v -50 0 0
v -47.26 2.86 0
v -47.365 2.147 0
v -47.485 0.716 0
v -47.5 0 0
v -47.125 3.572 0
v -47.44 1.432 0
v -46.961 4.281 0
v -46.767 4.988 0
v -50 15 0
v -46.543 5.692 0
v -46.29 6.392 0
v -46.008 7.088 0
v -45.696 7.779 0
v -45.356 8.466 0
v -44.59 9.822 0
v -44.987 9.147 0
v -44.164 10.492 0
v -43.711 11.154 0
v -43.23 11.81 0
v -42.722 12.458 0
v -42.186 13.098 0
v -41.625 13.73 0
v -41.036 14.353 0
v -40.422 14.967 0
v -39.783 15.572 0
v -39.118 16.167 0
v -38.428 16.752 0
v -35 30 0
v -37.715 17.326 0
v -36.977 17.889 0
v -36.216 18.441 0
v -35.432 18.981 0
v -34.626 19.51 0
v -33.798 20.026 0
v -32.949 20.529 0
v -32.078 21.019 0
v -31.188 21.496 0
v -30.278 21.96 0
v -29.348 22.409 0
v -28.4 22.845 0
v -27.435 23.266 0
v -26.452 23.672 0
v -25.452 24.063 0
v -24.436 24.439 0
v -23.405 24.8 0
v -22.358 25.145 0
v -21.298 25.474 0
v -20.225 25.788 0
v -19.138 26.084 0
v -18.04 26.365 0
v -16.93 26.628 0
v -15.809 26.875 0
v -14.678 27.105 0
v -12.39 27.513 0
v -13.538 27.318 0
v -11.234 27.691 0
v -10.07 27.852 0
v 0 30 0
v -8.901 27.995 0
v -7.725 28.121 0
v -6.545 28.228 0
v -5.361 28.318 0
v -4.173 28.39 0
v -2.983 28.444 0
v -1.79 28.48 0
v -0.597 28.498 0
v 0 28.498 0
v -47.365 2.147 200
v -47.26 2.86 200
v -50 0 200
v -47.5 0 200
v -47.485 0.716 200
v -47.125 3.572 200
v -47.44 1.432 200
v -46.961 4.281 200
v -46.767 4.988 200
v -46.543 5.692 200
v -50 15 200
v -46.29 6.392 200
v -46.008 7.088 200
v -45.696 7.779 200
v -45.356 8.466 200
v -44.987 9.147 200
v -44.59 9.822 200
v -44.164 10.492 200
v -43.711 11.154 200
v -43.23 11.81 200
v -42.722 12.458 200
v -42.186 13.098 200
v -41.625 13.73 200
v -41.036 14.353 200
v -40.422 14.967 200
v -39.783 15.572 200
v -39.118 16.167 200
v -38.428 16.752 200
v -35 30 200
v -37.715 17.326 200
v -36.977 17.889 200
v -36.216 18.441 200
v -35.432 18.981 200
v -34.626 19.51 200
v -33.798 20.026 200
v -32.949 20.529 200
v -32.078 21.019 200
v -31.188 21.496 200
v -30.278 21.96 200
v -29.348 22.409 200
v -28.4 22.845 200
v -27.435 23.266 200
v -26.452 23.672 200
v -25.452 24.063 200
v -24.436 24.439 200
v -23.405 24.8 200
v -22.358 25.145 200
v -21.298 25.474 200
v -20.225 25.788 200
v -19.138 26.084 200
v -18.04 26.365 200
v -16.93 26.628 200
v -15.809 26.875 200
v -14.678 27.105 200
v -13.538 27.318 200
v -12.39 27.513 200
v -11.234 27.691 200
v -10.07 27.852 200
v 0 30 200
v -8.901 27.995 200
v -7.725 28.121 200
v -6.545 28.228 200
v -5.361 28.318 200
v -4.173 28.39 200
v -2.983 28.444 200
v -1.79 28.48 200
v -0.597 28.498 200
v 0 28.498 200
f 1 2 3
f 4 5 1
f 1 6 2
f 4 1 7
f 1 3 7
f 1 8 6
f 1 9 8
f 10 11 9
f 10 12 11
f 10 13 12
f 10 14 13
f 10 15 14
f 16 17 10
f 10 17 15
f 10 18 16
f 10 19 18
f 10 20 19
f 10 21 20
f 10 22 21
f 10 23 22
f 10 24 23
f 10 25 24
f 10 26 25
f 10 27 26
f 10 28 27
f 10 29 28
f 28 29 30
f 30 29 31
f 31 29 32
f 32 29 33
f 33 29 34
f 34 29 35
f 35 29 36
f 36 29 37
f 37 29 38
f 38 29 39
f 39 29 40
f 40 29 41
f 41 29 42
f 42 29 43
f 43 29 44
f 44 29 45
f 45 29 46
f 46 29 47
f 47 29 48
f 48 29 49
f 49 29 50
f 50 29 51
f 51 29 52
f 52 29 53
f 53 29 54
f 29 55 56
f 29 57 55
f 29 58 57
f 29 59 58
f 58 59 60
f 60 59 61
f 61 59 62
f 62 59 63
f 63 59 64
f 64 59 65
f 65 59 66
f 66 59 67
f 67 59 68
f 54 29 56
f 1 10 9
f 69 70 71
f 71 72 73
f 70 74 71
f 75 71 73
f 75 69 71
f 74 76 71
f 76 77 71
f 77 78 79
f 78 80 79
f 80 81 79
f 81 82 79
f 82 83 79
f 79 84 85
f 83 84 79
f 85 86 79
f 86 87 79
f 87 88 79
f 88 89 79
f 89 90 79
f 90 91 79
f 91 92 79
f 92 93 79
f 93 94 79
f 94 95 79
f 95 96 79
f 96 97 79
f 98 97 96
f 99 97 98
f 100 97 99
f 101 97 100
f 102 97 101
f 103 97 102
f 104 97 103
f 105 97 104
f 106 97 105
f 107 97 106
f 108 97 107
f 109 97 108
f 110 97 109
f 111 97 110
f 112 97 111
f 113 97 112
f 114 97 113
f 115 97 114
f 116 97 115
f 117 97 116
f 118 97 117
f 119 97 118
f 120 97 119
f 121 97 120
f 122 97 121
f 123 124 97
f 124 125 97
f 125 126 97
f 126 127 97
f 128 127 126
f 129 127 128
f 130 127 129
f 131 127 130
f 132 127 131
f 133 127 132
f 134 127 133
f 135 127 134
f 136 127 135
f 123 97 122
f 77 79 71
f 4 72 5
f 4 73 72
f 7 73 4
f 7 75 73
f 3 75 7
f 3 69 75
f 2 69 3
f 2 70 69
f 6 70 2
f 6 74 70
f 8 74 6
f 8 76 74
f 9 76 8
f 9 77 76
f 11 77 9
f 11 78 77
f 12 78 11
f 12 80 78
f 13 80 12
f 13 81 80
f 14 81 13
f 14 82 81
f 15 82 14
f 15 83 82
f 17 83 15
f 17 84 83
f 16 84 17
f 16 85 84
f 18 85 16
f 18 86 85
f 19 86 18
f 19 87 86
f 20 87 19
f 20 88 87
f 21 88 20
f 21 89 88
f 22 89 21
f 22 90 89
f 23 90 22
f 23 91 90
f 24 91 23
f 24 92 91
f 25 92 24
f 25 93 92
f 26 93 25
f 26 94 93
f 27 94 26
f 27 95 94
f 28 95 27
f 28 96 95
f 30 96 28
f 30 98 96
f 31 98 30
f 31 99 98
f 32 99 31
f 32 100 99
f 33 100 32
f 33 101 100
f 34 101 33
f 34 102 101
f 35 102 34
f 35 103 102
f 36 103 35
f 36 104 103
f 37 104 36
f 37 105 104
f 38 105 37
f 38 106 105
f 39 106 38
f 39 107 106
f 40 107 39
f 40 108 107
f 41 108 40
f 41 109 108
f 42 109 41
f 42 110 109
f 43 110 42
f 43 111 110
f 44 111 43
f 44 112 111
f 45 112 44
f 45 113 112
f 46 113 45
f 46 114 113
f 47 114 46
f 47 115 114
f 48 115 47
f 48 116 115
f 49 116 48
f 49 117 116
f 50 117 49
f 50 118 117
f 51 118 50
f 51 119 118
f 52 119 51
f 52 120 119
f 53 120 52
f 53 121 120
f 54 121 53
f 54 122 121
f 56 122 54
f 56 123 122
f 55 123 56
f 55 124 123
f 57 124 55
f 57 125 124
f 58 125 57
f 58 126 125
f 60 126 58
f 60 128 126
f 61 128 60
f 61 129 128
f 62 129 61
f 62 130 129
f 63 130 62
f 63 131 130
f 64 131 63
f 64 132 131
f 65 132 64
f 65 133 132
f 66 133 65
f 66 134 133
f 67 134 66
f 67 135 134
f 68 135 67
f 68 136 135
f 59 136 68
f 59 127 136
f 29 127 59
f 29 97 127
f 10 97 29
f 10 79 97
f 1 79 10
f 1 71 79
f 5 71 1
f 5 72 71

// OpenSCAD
LENGTH = 200;
WIDTH = 50;
HEIGHT = 30;
DIA = 2 * WIDTH - 5;

ANGLED = false;

$fn = 250;

difference() {
    linear_extrude(LENGTH)
    difference() {
        polygon(points = [
            [-WIDTH, 0],
            [-WIDTH, HEIGHT],
            [0, HEIGHT],
            [0, 0],
        ]);
        scale([1.0, HEIGHT/WIDTH])
        circle(d = DIA);
        polygon(points = [
            [-WIDTH, min(HEIGHT, WIDTH)/2],
            [-WIDTH, HEIGHT],
            [-(WIDTH - min(HEIGHT, WIDTH)/2), HEIGHT]
        ]);
    }

    if(ANGLED) {
        translate([0, 0, LENGTH - WIDTH])
        rotate([0, -45, 0])
        cube(size = [WIDTH, HEIGHT, 2 * LENGTH]);
    }
}
